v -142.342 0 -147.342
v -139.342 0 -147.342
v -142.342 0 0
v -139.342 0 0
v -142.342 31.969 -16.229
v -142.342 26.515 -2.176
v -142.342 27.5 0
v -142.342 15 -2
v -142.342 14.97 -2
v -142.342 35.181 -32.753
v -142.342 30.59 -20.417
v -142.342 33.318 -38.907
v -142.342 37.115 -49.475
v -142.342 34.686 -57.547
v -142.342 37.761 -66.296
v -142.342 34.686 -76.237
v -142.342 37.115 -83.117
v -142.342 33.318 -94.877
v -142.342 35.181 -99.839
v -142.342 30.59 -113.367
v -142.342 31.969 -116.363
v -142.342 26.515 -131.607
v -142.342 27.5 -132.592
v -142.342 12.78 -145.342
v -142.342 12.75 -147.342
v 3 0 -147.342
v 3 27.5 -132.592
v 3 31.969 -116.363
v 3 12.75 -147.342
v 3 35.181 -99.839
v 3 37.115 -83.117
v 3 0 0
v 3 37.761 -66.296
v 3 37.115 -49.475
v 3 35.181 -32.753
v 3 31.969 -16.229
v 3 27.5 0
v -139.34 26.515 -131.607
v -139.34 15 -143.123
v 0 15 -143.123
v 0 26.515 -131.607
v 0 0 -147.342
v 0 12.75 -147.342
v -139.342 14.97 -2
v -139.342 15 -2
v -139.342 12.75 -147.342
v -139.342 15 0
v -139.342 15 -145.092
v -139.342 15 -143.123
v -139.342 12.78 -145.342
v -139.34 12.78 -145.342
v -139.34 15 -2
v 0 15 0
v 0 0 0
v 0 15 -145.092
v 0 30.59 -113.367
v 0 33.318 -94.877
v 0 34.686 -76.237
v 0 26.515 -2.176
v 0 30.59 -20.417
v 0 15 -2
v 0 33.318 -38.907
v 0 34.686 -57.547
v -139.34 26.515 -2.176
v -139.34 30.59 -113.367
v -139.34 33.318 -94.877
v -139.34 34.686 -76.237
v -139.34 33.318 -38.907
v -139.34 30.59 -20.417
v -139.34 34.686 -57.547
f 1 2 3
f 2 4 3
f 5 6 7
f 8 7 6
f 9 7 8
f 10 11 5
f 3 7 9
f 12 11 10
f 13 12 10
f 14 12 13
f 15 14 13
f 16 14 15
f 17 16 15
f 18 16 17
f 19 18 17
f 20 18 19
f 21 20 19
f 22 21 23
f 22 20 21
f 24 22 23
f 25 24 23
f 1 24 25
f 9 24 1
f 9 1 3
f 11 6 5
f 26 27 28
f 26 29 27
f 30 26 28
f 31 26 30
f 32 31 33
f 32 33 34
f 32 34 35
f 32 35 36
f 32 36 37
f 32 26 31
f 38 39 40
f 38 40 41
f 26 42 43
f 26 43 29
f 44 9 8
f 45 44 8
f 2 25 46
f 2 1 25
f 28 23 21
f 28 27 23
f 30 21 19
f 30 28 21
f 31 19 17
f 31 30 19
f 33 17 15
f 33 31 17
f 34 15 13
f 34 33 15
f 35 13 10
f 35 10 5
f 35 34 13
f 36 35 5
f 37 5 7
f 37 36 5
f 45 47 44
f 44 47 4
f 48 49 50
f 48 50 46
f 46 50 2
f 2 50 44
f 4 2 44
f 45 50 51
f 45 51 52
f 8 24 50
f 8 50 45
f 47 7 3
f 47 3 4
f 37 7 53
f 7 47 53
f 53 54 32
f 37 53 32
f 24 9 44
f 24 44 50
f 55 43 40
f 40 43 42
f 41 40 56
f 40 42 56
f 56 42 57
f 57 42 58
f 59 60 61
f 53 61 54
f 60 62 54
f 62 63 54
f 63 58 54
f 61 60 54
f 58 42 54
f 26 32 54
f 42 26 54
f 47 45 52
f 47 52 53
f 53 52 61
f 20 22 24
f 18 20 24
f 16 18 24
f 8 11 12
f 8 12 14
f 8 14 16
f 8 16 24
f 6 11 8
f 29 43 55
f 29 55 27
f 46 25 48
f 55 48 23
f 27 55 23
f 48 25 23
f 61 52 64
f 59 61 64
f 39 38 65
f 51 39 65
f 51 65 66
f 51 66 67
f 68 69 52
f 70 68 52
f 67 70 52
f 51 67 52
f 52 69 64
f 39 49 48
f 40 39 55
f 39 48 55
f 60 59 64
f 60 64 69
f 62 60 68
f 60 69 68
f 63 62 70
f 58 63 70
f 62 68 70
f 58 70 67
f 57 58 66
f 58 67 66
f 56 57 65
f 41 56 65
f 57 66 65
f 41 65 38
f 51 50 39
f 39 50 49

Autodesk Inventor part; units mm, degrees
ref_plane "YZ Plane" through (0, 0, 0) normal (1, 0, 0) x (0, 1, 0)
ref_plane "XZ Plane" through (0, 0, 0) normal (0, 1, 0) x (-1, 0, 0)
ref_plane "XY Plane" through (0, 0, 0) normal (0, 0, 1) x (1, 0, 0)
sketch "Sketch1" plane through (0, 0, 0) normal (0, 1, 0) x (-1, 0, 0)
  line L0 (0, 0) -> (139.342, 0)
  line L1 (139.342, 0) -> (139.342, -147.342)
  line L2 (139.342, -147.342) -> (0, -147.342)
  line L3 (0, -147.342) -> (0, 0)
  line L4 (139.342, -147.342) -> (142.342, -147.342)
  line L5 (142.342, -147.342) -> (142.342, 0)
  line L6 (142.342, 0) -> (139.342, 0)
  line L7 (0, 0) -> (-3, 0)
  line L8 (-3, 0) -> (-3, -147.342)
  line L9 (-3, -147.342) -> (0, -147.342)
  dimension "d0" = 139.342
  dimension "d1" = 147.342
  dimension "d2" = 3
  dimension "d3" = 3
extrude "Extrusion1" add sketch "Sketch1" along normal blind 15 contours L3 L9 L8 L7 | L6 L5 L4 L1
sketch "Sketch2" plane through (-139.342, 0, 0) normal (1, 0, 0) x (0, 0, -1)
  point P0 (0, 0)
sketch "Sketch3" plane through (0, 15, 0) normal (0, 1, 0) x (1, 0, 0)
  point P0 (0, 0)
sketch "Sketch4" plane through (0, 15, 0) normal (0, 1, 0) x (1, 0, 0)
  line L0 (-139.342, 147.342) -> (-142.342, 147.342) projected
  line L1 (0, 0) -> (3, 0) projected
  line L2 (-142.342, 147.342) -> (3, 147.342)
  line L3 (3, 147.342) -> (3, 0)
  line L4 (3, 0) -> (-142.342, 0)
  line L5 (-142.342, 0) -> (-142.342, 147.342)
extrude "Extrusion2" add sketch "Sketch4" along normal blind 12.5
chamfer "Chamfer1" distance 14.75 angle 45 1 edges at (-69.671, 27.5, -147.342)
sketch "Sketch5" plane through (3, 0, 0) normal (1, 0, 0) x (0, 0, -1)
  line L0 (132.592, 27.5) -> (147.342, 12.75) projected
  arc A0 (132.592, 27.5) -> (0, 27.5) centre (66.296, -181.534) ccw
  line L1 (0, 27.5) -> (132.592, 27.5)
  point P0 (0, 0)
extrude "Extrusion3" add sketch "Sketch5" against normal blind 145.342
sketch "Sketch6" plane through (-142.342, 0, -147.342) normal (-1, 0, 0) x (0, 0, 1)
  line L0 (147.342, 0) -> (147.342, 27.5) projected
  line L1 (147.342, 0) -> (147.342, 15)
  line L2 (0, 12.75) -> (14.75, 27.5) projected
  line L3 (147.342, 15) -> (0, 12.75)
  line L4 (0, 12.75) -> (1.9998, 12.7805)
  line L5 (1.9998, 12.7805) -> (15.7346, 26.5154)
  line L6 (147.342, 15) -> (145.3422, 14.9695)
  line L7 (145.3422, 14.9695) -> (145.1659, 26.5154)
  arc A0 (145.1659, 26.5154) -> (15.7346, 26.5154) centre (80.4503, -220.3584) ccw
  dimension "d13" = 15
  dimension "d14" = 2
  dimension "d15" = 2
extrude "Extrusion4" cut sketch "Sketch6" against normal blind 142.342
sketch "Sketch7" plane through (-142.342, 0, -147.342) normal (-1, 0, 0) x (0, 0, 1)
  line L0 (1.9998, 12.7805) -> (145.3422, 14.9695) projected
  arc A0 (145.1659, 26.5154) -> (15.7346, 26.5154) centre (80.4503, -220.3584) ccw projected
  line L1 (1.9998, 12.7805) -> (15.7346, 26.5154)
  line L2 (145.1659, 26.5154) -> (145.3418, 15) projected
  line L3 (145.1659, 26.5154) -> (145.3418, 15)
  line L4 (145.3418, 15) -> (145.3418, 15)
  line L5 (1.9998, 12.7805) -> (145.3418, 15)
  arc A1 (145.1659, 26.5154) -> (15.7346, 26.5154) centre (80.4503, -220.3584) ccw
  point P0 (147.342, 0)
extrude "Extrusion5" add sketch "Sketch7" against normal blind 3.002
properties part number "El capo"
